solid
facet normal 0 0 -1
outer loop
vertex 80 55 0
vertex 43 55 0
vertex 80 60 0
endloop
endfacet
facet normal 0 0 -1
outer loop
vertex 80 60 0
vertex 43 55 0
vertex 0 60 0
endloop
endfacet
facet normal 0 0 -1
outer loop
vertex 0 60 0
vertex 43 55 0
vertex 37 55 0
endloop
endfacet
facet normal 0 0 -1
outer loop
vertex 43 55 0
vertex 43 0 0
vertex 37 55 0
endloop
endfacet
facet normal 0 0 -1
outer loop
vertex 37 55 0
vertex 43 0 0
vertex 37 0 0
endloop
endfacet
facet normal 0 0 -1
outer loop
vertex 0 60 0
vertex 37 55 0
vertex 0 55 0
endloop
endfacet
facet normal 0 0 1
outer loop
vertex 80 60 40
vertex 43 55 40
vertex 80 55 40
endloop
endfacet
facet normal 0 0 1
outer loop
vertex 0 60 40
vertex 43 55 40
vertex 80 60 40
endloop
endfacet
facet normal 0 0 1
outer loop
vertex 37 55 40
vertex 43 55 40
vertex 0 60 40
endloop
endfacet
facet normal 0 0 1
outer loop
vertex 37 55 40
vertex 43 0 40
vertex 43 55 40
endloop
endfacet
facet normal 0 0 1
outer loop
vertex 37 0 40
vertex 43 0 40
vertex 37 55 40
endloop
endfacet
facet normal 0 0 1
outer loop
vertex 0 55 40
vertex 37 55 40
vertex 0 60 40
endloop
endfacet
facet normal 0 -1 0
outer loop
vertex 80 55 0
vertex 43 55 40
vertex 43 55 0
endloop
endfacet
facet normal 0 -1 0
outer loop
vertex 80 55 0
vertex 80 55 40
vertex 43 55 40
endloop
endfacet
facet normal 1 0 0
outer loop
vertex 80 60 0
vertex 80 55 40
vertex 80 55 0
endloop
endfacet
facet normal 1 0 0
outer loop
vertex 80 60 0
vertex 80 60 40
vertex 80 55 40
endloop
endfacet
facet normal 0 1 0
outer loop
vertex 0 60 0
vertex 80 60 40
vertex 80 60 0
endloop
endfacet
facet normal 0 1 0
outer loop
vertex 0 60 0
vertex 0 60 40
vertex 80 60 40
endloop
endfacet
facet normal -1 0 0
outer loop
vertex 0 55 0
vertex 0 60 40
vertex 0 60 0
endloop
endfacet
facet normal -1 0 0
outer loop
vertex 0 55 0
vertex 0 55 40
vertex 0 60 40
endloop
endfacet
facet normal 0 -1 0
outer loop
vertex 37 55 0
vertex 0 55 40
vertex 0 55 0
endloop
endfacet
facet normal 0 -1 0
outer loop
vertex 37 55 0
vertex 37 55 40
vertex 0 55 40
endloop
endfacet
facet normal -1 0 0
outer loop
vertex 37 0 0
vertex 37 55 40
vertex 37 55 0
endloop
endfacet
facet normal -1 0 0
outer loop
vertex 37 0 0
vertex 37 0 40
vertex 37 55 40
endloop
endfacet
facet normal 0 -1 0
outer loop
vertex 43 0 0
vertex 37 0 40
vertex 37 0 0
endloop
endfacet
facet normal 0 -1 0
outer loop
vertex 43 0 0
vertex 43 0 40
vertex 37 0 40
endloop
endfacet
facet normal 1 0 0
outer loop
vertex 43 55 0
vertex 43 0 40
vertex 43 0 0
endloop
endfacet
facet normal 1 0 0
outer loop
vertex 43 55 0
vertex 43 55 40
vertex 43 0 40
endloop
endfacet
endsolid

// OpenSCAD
$fn = 32;

// ----------------------------------------------------------------------
// Structural section: tee 80 x 60 mm
// ----------------------------------------------------------------------

// --- parameters (mm) ---
sec_w = 80;               // tee width, X
sec_h = 60;               // tee height, Y
flange_t = 5;             // top flange thickness
web_t = 6;                // web thickness
plate_t = 40;             // cut length, Z (extrusion height)

profile = [[37, 0], [43, 0], [43, 55], [80, 55], [80, 60], [0, 60], [0, 55], [37, 55]];  // primary outline, 8 points, counter clockwise

// --- the one profile operation ---
linear_extrude(height = plate_t) polygon(points = profile);
